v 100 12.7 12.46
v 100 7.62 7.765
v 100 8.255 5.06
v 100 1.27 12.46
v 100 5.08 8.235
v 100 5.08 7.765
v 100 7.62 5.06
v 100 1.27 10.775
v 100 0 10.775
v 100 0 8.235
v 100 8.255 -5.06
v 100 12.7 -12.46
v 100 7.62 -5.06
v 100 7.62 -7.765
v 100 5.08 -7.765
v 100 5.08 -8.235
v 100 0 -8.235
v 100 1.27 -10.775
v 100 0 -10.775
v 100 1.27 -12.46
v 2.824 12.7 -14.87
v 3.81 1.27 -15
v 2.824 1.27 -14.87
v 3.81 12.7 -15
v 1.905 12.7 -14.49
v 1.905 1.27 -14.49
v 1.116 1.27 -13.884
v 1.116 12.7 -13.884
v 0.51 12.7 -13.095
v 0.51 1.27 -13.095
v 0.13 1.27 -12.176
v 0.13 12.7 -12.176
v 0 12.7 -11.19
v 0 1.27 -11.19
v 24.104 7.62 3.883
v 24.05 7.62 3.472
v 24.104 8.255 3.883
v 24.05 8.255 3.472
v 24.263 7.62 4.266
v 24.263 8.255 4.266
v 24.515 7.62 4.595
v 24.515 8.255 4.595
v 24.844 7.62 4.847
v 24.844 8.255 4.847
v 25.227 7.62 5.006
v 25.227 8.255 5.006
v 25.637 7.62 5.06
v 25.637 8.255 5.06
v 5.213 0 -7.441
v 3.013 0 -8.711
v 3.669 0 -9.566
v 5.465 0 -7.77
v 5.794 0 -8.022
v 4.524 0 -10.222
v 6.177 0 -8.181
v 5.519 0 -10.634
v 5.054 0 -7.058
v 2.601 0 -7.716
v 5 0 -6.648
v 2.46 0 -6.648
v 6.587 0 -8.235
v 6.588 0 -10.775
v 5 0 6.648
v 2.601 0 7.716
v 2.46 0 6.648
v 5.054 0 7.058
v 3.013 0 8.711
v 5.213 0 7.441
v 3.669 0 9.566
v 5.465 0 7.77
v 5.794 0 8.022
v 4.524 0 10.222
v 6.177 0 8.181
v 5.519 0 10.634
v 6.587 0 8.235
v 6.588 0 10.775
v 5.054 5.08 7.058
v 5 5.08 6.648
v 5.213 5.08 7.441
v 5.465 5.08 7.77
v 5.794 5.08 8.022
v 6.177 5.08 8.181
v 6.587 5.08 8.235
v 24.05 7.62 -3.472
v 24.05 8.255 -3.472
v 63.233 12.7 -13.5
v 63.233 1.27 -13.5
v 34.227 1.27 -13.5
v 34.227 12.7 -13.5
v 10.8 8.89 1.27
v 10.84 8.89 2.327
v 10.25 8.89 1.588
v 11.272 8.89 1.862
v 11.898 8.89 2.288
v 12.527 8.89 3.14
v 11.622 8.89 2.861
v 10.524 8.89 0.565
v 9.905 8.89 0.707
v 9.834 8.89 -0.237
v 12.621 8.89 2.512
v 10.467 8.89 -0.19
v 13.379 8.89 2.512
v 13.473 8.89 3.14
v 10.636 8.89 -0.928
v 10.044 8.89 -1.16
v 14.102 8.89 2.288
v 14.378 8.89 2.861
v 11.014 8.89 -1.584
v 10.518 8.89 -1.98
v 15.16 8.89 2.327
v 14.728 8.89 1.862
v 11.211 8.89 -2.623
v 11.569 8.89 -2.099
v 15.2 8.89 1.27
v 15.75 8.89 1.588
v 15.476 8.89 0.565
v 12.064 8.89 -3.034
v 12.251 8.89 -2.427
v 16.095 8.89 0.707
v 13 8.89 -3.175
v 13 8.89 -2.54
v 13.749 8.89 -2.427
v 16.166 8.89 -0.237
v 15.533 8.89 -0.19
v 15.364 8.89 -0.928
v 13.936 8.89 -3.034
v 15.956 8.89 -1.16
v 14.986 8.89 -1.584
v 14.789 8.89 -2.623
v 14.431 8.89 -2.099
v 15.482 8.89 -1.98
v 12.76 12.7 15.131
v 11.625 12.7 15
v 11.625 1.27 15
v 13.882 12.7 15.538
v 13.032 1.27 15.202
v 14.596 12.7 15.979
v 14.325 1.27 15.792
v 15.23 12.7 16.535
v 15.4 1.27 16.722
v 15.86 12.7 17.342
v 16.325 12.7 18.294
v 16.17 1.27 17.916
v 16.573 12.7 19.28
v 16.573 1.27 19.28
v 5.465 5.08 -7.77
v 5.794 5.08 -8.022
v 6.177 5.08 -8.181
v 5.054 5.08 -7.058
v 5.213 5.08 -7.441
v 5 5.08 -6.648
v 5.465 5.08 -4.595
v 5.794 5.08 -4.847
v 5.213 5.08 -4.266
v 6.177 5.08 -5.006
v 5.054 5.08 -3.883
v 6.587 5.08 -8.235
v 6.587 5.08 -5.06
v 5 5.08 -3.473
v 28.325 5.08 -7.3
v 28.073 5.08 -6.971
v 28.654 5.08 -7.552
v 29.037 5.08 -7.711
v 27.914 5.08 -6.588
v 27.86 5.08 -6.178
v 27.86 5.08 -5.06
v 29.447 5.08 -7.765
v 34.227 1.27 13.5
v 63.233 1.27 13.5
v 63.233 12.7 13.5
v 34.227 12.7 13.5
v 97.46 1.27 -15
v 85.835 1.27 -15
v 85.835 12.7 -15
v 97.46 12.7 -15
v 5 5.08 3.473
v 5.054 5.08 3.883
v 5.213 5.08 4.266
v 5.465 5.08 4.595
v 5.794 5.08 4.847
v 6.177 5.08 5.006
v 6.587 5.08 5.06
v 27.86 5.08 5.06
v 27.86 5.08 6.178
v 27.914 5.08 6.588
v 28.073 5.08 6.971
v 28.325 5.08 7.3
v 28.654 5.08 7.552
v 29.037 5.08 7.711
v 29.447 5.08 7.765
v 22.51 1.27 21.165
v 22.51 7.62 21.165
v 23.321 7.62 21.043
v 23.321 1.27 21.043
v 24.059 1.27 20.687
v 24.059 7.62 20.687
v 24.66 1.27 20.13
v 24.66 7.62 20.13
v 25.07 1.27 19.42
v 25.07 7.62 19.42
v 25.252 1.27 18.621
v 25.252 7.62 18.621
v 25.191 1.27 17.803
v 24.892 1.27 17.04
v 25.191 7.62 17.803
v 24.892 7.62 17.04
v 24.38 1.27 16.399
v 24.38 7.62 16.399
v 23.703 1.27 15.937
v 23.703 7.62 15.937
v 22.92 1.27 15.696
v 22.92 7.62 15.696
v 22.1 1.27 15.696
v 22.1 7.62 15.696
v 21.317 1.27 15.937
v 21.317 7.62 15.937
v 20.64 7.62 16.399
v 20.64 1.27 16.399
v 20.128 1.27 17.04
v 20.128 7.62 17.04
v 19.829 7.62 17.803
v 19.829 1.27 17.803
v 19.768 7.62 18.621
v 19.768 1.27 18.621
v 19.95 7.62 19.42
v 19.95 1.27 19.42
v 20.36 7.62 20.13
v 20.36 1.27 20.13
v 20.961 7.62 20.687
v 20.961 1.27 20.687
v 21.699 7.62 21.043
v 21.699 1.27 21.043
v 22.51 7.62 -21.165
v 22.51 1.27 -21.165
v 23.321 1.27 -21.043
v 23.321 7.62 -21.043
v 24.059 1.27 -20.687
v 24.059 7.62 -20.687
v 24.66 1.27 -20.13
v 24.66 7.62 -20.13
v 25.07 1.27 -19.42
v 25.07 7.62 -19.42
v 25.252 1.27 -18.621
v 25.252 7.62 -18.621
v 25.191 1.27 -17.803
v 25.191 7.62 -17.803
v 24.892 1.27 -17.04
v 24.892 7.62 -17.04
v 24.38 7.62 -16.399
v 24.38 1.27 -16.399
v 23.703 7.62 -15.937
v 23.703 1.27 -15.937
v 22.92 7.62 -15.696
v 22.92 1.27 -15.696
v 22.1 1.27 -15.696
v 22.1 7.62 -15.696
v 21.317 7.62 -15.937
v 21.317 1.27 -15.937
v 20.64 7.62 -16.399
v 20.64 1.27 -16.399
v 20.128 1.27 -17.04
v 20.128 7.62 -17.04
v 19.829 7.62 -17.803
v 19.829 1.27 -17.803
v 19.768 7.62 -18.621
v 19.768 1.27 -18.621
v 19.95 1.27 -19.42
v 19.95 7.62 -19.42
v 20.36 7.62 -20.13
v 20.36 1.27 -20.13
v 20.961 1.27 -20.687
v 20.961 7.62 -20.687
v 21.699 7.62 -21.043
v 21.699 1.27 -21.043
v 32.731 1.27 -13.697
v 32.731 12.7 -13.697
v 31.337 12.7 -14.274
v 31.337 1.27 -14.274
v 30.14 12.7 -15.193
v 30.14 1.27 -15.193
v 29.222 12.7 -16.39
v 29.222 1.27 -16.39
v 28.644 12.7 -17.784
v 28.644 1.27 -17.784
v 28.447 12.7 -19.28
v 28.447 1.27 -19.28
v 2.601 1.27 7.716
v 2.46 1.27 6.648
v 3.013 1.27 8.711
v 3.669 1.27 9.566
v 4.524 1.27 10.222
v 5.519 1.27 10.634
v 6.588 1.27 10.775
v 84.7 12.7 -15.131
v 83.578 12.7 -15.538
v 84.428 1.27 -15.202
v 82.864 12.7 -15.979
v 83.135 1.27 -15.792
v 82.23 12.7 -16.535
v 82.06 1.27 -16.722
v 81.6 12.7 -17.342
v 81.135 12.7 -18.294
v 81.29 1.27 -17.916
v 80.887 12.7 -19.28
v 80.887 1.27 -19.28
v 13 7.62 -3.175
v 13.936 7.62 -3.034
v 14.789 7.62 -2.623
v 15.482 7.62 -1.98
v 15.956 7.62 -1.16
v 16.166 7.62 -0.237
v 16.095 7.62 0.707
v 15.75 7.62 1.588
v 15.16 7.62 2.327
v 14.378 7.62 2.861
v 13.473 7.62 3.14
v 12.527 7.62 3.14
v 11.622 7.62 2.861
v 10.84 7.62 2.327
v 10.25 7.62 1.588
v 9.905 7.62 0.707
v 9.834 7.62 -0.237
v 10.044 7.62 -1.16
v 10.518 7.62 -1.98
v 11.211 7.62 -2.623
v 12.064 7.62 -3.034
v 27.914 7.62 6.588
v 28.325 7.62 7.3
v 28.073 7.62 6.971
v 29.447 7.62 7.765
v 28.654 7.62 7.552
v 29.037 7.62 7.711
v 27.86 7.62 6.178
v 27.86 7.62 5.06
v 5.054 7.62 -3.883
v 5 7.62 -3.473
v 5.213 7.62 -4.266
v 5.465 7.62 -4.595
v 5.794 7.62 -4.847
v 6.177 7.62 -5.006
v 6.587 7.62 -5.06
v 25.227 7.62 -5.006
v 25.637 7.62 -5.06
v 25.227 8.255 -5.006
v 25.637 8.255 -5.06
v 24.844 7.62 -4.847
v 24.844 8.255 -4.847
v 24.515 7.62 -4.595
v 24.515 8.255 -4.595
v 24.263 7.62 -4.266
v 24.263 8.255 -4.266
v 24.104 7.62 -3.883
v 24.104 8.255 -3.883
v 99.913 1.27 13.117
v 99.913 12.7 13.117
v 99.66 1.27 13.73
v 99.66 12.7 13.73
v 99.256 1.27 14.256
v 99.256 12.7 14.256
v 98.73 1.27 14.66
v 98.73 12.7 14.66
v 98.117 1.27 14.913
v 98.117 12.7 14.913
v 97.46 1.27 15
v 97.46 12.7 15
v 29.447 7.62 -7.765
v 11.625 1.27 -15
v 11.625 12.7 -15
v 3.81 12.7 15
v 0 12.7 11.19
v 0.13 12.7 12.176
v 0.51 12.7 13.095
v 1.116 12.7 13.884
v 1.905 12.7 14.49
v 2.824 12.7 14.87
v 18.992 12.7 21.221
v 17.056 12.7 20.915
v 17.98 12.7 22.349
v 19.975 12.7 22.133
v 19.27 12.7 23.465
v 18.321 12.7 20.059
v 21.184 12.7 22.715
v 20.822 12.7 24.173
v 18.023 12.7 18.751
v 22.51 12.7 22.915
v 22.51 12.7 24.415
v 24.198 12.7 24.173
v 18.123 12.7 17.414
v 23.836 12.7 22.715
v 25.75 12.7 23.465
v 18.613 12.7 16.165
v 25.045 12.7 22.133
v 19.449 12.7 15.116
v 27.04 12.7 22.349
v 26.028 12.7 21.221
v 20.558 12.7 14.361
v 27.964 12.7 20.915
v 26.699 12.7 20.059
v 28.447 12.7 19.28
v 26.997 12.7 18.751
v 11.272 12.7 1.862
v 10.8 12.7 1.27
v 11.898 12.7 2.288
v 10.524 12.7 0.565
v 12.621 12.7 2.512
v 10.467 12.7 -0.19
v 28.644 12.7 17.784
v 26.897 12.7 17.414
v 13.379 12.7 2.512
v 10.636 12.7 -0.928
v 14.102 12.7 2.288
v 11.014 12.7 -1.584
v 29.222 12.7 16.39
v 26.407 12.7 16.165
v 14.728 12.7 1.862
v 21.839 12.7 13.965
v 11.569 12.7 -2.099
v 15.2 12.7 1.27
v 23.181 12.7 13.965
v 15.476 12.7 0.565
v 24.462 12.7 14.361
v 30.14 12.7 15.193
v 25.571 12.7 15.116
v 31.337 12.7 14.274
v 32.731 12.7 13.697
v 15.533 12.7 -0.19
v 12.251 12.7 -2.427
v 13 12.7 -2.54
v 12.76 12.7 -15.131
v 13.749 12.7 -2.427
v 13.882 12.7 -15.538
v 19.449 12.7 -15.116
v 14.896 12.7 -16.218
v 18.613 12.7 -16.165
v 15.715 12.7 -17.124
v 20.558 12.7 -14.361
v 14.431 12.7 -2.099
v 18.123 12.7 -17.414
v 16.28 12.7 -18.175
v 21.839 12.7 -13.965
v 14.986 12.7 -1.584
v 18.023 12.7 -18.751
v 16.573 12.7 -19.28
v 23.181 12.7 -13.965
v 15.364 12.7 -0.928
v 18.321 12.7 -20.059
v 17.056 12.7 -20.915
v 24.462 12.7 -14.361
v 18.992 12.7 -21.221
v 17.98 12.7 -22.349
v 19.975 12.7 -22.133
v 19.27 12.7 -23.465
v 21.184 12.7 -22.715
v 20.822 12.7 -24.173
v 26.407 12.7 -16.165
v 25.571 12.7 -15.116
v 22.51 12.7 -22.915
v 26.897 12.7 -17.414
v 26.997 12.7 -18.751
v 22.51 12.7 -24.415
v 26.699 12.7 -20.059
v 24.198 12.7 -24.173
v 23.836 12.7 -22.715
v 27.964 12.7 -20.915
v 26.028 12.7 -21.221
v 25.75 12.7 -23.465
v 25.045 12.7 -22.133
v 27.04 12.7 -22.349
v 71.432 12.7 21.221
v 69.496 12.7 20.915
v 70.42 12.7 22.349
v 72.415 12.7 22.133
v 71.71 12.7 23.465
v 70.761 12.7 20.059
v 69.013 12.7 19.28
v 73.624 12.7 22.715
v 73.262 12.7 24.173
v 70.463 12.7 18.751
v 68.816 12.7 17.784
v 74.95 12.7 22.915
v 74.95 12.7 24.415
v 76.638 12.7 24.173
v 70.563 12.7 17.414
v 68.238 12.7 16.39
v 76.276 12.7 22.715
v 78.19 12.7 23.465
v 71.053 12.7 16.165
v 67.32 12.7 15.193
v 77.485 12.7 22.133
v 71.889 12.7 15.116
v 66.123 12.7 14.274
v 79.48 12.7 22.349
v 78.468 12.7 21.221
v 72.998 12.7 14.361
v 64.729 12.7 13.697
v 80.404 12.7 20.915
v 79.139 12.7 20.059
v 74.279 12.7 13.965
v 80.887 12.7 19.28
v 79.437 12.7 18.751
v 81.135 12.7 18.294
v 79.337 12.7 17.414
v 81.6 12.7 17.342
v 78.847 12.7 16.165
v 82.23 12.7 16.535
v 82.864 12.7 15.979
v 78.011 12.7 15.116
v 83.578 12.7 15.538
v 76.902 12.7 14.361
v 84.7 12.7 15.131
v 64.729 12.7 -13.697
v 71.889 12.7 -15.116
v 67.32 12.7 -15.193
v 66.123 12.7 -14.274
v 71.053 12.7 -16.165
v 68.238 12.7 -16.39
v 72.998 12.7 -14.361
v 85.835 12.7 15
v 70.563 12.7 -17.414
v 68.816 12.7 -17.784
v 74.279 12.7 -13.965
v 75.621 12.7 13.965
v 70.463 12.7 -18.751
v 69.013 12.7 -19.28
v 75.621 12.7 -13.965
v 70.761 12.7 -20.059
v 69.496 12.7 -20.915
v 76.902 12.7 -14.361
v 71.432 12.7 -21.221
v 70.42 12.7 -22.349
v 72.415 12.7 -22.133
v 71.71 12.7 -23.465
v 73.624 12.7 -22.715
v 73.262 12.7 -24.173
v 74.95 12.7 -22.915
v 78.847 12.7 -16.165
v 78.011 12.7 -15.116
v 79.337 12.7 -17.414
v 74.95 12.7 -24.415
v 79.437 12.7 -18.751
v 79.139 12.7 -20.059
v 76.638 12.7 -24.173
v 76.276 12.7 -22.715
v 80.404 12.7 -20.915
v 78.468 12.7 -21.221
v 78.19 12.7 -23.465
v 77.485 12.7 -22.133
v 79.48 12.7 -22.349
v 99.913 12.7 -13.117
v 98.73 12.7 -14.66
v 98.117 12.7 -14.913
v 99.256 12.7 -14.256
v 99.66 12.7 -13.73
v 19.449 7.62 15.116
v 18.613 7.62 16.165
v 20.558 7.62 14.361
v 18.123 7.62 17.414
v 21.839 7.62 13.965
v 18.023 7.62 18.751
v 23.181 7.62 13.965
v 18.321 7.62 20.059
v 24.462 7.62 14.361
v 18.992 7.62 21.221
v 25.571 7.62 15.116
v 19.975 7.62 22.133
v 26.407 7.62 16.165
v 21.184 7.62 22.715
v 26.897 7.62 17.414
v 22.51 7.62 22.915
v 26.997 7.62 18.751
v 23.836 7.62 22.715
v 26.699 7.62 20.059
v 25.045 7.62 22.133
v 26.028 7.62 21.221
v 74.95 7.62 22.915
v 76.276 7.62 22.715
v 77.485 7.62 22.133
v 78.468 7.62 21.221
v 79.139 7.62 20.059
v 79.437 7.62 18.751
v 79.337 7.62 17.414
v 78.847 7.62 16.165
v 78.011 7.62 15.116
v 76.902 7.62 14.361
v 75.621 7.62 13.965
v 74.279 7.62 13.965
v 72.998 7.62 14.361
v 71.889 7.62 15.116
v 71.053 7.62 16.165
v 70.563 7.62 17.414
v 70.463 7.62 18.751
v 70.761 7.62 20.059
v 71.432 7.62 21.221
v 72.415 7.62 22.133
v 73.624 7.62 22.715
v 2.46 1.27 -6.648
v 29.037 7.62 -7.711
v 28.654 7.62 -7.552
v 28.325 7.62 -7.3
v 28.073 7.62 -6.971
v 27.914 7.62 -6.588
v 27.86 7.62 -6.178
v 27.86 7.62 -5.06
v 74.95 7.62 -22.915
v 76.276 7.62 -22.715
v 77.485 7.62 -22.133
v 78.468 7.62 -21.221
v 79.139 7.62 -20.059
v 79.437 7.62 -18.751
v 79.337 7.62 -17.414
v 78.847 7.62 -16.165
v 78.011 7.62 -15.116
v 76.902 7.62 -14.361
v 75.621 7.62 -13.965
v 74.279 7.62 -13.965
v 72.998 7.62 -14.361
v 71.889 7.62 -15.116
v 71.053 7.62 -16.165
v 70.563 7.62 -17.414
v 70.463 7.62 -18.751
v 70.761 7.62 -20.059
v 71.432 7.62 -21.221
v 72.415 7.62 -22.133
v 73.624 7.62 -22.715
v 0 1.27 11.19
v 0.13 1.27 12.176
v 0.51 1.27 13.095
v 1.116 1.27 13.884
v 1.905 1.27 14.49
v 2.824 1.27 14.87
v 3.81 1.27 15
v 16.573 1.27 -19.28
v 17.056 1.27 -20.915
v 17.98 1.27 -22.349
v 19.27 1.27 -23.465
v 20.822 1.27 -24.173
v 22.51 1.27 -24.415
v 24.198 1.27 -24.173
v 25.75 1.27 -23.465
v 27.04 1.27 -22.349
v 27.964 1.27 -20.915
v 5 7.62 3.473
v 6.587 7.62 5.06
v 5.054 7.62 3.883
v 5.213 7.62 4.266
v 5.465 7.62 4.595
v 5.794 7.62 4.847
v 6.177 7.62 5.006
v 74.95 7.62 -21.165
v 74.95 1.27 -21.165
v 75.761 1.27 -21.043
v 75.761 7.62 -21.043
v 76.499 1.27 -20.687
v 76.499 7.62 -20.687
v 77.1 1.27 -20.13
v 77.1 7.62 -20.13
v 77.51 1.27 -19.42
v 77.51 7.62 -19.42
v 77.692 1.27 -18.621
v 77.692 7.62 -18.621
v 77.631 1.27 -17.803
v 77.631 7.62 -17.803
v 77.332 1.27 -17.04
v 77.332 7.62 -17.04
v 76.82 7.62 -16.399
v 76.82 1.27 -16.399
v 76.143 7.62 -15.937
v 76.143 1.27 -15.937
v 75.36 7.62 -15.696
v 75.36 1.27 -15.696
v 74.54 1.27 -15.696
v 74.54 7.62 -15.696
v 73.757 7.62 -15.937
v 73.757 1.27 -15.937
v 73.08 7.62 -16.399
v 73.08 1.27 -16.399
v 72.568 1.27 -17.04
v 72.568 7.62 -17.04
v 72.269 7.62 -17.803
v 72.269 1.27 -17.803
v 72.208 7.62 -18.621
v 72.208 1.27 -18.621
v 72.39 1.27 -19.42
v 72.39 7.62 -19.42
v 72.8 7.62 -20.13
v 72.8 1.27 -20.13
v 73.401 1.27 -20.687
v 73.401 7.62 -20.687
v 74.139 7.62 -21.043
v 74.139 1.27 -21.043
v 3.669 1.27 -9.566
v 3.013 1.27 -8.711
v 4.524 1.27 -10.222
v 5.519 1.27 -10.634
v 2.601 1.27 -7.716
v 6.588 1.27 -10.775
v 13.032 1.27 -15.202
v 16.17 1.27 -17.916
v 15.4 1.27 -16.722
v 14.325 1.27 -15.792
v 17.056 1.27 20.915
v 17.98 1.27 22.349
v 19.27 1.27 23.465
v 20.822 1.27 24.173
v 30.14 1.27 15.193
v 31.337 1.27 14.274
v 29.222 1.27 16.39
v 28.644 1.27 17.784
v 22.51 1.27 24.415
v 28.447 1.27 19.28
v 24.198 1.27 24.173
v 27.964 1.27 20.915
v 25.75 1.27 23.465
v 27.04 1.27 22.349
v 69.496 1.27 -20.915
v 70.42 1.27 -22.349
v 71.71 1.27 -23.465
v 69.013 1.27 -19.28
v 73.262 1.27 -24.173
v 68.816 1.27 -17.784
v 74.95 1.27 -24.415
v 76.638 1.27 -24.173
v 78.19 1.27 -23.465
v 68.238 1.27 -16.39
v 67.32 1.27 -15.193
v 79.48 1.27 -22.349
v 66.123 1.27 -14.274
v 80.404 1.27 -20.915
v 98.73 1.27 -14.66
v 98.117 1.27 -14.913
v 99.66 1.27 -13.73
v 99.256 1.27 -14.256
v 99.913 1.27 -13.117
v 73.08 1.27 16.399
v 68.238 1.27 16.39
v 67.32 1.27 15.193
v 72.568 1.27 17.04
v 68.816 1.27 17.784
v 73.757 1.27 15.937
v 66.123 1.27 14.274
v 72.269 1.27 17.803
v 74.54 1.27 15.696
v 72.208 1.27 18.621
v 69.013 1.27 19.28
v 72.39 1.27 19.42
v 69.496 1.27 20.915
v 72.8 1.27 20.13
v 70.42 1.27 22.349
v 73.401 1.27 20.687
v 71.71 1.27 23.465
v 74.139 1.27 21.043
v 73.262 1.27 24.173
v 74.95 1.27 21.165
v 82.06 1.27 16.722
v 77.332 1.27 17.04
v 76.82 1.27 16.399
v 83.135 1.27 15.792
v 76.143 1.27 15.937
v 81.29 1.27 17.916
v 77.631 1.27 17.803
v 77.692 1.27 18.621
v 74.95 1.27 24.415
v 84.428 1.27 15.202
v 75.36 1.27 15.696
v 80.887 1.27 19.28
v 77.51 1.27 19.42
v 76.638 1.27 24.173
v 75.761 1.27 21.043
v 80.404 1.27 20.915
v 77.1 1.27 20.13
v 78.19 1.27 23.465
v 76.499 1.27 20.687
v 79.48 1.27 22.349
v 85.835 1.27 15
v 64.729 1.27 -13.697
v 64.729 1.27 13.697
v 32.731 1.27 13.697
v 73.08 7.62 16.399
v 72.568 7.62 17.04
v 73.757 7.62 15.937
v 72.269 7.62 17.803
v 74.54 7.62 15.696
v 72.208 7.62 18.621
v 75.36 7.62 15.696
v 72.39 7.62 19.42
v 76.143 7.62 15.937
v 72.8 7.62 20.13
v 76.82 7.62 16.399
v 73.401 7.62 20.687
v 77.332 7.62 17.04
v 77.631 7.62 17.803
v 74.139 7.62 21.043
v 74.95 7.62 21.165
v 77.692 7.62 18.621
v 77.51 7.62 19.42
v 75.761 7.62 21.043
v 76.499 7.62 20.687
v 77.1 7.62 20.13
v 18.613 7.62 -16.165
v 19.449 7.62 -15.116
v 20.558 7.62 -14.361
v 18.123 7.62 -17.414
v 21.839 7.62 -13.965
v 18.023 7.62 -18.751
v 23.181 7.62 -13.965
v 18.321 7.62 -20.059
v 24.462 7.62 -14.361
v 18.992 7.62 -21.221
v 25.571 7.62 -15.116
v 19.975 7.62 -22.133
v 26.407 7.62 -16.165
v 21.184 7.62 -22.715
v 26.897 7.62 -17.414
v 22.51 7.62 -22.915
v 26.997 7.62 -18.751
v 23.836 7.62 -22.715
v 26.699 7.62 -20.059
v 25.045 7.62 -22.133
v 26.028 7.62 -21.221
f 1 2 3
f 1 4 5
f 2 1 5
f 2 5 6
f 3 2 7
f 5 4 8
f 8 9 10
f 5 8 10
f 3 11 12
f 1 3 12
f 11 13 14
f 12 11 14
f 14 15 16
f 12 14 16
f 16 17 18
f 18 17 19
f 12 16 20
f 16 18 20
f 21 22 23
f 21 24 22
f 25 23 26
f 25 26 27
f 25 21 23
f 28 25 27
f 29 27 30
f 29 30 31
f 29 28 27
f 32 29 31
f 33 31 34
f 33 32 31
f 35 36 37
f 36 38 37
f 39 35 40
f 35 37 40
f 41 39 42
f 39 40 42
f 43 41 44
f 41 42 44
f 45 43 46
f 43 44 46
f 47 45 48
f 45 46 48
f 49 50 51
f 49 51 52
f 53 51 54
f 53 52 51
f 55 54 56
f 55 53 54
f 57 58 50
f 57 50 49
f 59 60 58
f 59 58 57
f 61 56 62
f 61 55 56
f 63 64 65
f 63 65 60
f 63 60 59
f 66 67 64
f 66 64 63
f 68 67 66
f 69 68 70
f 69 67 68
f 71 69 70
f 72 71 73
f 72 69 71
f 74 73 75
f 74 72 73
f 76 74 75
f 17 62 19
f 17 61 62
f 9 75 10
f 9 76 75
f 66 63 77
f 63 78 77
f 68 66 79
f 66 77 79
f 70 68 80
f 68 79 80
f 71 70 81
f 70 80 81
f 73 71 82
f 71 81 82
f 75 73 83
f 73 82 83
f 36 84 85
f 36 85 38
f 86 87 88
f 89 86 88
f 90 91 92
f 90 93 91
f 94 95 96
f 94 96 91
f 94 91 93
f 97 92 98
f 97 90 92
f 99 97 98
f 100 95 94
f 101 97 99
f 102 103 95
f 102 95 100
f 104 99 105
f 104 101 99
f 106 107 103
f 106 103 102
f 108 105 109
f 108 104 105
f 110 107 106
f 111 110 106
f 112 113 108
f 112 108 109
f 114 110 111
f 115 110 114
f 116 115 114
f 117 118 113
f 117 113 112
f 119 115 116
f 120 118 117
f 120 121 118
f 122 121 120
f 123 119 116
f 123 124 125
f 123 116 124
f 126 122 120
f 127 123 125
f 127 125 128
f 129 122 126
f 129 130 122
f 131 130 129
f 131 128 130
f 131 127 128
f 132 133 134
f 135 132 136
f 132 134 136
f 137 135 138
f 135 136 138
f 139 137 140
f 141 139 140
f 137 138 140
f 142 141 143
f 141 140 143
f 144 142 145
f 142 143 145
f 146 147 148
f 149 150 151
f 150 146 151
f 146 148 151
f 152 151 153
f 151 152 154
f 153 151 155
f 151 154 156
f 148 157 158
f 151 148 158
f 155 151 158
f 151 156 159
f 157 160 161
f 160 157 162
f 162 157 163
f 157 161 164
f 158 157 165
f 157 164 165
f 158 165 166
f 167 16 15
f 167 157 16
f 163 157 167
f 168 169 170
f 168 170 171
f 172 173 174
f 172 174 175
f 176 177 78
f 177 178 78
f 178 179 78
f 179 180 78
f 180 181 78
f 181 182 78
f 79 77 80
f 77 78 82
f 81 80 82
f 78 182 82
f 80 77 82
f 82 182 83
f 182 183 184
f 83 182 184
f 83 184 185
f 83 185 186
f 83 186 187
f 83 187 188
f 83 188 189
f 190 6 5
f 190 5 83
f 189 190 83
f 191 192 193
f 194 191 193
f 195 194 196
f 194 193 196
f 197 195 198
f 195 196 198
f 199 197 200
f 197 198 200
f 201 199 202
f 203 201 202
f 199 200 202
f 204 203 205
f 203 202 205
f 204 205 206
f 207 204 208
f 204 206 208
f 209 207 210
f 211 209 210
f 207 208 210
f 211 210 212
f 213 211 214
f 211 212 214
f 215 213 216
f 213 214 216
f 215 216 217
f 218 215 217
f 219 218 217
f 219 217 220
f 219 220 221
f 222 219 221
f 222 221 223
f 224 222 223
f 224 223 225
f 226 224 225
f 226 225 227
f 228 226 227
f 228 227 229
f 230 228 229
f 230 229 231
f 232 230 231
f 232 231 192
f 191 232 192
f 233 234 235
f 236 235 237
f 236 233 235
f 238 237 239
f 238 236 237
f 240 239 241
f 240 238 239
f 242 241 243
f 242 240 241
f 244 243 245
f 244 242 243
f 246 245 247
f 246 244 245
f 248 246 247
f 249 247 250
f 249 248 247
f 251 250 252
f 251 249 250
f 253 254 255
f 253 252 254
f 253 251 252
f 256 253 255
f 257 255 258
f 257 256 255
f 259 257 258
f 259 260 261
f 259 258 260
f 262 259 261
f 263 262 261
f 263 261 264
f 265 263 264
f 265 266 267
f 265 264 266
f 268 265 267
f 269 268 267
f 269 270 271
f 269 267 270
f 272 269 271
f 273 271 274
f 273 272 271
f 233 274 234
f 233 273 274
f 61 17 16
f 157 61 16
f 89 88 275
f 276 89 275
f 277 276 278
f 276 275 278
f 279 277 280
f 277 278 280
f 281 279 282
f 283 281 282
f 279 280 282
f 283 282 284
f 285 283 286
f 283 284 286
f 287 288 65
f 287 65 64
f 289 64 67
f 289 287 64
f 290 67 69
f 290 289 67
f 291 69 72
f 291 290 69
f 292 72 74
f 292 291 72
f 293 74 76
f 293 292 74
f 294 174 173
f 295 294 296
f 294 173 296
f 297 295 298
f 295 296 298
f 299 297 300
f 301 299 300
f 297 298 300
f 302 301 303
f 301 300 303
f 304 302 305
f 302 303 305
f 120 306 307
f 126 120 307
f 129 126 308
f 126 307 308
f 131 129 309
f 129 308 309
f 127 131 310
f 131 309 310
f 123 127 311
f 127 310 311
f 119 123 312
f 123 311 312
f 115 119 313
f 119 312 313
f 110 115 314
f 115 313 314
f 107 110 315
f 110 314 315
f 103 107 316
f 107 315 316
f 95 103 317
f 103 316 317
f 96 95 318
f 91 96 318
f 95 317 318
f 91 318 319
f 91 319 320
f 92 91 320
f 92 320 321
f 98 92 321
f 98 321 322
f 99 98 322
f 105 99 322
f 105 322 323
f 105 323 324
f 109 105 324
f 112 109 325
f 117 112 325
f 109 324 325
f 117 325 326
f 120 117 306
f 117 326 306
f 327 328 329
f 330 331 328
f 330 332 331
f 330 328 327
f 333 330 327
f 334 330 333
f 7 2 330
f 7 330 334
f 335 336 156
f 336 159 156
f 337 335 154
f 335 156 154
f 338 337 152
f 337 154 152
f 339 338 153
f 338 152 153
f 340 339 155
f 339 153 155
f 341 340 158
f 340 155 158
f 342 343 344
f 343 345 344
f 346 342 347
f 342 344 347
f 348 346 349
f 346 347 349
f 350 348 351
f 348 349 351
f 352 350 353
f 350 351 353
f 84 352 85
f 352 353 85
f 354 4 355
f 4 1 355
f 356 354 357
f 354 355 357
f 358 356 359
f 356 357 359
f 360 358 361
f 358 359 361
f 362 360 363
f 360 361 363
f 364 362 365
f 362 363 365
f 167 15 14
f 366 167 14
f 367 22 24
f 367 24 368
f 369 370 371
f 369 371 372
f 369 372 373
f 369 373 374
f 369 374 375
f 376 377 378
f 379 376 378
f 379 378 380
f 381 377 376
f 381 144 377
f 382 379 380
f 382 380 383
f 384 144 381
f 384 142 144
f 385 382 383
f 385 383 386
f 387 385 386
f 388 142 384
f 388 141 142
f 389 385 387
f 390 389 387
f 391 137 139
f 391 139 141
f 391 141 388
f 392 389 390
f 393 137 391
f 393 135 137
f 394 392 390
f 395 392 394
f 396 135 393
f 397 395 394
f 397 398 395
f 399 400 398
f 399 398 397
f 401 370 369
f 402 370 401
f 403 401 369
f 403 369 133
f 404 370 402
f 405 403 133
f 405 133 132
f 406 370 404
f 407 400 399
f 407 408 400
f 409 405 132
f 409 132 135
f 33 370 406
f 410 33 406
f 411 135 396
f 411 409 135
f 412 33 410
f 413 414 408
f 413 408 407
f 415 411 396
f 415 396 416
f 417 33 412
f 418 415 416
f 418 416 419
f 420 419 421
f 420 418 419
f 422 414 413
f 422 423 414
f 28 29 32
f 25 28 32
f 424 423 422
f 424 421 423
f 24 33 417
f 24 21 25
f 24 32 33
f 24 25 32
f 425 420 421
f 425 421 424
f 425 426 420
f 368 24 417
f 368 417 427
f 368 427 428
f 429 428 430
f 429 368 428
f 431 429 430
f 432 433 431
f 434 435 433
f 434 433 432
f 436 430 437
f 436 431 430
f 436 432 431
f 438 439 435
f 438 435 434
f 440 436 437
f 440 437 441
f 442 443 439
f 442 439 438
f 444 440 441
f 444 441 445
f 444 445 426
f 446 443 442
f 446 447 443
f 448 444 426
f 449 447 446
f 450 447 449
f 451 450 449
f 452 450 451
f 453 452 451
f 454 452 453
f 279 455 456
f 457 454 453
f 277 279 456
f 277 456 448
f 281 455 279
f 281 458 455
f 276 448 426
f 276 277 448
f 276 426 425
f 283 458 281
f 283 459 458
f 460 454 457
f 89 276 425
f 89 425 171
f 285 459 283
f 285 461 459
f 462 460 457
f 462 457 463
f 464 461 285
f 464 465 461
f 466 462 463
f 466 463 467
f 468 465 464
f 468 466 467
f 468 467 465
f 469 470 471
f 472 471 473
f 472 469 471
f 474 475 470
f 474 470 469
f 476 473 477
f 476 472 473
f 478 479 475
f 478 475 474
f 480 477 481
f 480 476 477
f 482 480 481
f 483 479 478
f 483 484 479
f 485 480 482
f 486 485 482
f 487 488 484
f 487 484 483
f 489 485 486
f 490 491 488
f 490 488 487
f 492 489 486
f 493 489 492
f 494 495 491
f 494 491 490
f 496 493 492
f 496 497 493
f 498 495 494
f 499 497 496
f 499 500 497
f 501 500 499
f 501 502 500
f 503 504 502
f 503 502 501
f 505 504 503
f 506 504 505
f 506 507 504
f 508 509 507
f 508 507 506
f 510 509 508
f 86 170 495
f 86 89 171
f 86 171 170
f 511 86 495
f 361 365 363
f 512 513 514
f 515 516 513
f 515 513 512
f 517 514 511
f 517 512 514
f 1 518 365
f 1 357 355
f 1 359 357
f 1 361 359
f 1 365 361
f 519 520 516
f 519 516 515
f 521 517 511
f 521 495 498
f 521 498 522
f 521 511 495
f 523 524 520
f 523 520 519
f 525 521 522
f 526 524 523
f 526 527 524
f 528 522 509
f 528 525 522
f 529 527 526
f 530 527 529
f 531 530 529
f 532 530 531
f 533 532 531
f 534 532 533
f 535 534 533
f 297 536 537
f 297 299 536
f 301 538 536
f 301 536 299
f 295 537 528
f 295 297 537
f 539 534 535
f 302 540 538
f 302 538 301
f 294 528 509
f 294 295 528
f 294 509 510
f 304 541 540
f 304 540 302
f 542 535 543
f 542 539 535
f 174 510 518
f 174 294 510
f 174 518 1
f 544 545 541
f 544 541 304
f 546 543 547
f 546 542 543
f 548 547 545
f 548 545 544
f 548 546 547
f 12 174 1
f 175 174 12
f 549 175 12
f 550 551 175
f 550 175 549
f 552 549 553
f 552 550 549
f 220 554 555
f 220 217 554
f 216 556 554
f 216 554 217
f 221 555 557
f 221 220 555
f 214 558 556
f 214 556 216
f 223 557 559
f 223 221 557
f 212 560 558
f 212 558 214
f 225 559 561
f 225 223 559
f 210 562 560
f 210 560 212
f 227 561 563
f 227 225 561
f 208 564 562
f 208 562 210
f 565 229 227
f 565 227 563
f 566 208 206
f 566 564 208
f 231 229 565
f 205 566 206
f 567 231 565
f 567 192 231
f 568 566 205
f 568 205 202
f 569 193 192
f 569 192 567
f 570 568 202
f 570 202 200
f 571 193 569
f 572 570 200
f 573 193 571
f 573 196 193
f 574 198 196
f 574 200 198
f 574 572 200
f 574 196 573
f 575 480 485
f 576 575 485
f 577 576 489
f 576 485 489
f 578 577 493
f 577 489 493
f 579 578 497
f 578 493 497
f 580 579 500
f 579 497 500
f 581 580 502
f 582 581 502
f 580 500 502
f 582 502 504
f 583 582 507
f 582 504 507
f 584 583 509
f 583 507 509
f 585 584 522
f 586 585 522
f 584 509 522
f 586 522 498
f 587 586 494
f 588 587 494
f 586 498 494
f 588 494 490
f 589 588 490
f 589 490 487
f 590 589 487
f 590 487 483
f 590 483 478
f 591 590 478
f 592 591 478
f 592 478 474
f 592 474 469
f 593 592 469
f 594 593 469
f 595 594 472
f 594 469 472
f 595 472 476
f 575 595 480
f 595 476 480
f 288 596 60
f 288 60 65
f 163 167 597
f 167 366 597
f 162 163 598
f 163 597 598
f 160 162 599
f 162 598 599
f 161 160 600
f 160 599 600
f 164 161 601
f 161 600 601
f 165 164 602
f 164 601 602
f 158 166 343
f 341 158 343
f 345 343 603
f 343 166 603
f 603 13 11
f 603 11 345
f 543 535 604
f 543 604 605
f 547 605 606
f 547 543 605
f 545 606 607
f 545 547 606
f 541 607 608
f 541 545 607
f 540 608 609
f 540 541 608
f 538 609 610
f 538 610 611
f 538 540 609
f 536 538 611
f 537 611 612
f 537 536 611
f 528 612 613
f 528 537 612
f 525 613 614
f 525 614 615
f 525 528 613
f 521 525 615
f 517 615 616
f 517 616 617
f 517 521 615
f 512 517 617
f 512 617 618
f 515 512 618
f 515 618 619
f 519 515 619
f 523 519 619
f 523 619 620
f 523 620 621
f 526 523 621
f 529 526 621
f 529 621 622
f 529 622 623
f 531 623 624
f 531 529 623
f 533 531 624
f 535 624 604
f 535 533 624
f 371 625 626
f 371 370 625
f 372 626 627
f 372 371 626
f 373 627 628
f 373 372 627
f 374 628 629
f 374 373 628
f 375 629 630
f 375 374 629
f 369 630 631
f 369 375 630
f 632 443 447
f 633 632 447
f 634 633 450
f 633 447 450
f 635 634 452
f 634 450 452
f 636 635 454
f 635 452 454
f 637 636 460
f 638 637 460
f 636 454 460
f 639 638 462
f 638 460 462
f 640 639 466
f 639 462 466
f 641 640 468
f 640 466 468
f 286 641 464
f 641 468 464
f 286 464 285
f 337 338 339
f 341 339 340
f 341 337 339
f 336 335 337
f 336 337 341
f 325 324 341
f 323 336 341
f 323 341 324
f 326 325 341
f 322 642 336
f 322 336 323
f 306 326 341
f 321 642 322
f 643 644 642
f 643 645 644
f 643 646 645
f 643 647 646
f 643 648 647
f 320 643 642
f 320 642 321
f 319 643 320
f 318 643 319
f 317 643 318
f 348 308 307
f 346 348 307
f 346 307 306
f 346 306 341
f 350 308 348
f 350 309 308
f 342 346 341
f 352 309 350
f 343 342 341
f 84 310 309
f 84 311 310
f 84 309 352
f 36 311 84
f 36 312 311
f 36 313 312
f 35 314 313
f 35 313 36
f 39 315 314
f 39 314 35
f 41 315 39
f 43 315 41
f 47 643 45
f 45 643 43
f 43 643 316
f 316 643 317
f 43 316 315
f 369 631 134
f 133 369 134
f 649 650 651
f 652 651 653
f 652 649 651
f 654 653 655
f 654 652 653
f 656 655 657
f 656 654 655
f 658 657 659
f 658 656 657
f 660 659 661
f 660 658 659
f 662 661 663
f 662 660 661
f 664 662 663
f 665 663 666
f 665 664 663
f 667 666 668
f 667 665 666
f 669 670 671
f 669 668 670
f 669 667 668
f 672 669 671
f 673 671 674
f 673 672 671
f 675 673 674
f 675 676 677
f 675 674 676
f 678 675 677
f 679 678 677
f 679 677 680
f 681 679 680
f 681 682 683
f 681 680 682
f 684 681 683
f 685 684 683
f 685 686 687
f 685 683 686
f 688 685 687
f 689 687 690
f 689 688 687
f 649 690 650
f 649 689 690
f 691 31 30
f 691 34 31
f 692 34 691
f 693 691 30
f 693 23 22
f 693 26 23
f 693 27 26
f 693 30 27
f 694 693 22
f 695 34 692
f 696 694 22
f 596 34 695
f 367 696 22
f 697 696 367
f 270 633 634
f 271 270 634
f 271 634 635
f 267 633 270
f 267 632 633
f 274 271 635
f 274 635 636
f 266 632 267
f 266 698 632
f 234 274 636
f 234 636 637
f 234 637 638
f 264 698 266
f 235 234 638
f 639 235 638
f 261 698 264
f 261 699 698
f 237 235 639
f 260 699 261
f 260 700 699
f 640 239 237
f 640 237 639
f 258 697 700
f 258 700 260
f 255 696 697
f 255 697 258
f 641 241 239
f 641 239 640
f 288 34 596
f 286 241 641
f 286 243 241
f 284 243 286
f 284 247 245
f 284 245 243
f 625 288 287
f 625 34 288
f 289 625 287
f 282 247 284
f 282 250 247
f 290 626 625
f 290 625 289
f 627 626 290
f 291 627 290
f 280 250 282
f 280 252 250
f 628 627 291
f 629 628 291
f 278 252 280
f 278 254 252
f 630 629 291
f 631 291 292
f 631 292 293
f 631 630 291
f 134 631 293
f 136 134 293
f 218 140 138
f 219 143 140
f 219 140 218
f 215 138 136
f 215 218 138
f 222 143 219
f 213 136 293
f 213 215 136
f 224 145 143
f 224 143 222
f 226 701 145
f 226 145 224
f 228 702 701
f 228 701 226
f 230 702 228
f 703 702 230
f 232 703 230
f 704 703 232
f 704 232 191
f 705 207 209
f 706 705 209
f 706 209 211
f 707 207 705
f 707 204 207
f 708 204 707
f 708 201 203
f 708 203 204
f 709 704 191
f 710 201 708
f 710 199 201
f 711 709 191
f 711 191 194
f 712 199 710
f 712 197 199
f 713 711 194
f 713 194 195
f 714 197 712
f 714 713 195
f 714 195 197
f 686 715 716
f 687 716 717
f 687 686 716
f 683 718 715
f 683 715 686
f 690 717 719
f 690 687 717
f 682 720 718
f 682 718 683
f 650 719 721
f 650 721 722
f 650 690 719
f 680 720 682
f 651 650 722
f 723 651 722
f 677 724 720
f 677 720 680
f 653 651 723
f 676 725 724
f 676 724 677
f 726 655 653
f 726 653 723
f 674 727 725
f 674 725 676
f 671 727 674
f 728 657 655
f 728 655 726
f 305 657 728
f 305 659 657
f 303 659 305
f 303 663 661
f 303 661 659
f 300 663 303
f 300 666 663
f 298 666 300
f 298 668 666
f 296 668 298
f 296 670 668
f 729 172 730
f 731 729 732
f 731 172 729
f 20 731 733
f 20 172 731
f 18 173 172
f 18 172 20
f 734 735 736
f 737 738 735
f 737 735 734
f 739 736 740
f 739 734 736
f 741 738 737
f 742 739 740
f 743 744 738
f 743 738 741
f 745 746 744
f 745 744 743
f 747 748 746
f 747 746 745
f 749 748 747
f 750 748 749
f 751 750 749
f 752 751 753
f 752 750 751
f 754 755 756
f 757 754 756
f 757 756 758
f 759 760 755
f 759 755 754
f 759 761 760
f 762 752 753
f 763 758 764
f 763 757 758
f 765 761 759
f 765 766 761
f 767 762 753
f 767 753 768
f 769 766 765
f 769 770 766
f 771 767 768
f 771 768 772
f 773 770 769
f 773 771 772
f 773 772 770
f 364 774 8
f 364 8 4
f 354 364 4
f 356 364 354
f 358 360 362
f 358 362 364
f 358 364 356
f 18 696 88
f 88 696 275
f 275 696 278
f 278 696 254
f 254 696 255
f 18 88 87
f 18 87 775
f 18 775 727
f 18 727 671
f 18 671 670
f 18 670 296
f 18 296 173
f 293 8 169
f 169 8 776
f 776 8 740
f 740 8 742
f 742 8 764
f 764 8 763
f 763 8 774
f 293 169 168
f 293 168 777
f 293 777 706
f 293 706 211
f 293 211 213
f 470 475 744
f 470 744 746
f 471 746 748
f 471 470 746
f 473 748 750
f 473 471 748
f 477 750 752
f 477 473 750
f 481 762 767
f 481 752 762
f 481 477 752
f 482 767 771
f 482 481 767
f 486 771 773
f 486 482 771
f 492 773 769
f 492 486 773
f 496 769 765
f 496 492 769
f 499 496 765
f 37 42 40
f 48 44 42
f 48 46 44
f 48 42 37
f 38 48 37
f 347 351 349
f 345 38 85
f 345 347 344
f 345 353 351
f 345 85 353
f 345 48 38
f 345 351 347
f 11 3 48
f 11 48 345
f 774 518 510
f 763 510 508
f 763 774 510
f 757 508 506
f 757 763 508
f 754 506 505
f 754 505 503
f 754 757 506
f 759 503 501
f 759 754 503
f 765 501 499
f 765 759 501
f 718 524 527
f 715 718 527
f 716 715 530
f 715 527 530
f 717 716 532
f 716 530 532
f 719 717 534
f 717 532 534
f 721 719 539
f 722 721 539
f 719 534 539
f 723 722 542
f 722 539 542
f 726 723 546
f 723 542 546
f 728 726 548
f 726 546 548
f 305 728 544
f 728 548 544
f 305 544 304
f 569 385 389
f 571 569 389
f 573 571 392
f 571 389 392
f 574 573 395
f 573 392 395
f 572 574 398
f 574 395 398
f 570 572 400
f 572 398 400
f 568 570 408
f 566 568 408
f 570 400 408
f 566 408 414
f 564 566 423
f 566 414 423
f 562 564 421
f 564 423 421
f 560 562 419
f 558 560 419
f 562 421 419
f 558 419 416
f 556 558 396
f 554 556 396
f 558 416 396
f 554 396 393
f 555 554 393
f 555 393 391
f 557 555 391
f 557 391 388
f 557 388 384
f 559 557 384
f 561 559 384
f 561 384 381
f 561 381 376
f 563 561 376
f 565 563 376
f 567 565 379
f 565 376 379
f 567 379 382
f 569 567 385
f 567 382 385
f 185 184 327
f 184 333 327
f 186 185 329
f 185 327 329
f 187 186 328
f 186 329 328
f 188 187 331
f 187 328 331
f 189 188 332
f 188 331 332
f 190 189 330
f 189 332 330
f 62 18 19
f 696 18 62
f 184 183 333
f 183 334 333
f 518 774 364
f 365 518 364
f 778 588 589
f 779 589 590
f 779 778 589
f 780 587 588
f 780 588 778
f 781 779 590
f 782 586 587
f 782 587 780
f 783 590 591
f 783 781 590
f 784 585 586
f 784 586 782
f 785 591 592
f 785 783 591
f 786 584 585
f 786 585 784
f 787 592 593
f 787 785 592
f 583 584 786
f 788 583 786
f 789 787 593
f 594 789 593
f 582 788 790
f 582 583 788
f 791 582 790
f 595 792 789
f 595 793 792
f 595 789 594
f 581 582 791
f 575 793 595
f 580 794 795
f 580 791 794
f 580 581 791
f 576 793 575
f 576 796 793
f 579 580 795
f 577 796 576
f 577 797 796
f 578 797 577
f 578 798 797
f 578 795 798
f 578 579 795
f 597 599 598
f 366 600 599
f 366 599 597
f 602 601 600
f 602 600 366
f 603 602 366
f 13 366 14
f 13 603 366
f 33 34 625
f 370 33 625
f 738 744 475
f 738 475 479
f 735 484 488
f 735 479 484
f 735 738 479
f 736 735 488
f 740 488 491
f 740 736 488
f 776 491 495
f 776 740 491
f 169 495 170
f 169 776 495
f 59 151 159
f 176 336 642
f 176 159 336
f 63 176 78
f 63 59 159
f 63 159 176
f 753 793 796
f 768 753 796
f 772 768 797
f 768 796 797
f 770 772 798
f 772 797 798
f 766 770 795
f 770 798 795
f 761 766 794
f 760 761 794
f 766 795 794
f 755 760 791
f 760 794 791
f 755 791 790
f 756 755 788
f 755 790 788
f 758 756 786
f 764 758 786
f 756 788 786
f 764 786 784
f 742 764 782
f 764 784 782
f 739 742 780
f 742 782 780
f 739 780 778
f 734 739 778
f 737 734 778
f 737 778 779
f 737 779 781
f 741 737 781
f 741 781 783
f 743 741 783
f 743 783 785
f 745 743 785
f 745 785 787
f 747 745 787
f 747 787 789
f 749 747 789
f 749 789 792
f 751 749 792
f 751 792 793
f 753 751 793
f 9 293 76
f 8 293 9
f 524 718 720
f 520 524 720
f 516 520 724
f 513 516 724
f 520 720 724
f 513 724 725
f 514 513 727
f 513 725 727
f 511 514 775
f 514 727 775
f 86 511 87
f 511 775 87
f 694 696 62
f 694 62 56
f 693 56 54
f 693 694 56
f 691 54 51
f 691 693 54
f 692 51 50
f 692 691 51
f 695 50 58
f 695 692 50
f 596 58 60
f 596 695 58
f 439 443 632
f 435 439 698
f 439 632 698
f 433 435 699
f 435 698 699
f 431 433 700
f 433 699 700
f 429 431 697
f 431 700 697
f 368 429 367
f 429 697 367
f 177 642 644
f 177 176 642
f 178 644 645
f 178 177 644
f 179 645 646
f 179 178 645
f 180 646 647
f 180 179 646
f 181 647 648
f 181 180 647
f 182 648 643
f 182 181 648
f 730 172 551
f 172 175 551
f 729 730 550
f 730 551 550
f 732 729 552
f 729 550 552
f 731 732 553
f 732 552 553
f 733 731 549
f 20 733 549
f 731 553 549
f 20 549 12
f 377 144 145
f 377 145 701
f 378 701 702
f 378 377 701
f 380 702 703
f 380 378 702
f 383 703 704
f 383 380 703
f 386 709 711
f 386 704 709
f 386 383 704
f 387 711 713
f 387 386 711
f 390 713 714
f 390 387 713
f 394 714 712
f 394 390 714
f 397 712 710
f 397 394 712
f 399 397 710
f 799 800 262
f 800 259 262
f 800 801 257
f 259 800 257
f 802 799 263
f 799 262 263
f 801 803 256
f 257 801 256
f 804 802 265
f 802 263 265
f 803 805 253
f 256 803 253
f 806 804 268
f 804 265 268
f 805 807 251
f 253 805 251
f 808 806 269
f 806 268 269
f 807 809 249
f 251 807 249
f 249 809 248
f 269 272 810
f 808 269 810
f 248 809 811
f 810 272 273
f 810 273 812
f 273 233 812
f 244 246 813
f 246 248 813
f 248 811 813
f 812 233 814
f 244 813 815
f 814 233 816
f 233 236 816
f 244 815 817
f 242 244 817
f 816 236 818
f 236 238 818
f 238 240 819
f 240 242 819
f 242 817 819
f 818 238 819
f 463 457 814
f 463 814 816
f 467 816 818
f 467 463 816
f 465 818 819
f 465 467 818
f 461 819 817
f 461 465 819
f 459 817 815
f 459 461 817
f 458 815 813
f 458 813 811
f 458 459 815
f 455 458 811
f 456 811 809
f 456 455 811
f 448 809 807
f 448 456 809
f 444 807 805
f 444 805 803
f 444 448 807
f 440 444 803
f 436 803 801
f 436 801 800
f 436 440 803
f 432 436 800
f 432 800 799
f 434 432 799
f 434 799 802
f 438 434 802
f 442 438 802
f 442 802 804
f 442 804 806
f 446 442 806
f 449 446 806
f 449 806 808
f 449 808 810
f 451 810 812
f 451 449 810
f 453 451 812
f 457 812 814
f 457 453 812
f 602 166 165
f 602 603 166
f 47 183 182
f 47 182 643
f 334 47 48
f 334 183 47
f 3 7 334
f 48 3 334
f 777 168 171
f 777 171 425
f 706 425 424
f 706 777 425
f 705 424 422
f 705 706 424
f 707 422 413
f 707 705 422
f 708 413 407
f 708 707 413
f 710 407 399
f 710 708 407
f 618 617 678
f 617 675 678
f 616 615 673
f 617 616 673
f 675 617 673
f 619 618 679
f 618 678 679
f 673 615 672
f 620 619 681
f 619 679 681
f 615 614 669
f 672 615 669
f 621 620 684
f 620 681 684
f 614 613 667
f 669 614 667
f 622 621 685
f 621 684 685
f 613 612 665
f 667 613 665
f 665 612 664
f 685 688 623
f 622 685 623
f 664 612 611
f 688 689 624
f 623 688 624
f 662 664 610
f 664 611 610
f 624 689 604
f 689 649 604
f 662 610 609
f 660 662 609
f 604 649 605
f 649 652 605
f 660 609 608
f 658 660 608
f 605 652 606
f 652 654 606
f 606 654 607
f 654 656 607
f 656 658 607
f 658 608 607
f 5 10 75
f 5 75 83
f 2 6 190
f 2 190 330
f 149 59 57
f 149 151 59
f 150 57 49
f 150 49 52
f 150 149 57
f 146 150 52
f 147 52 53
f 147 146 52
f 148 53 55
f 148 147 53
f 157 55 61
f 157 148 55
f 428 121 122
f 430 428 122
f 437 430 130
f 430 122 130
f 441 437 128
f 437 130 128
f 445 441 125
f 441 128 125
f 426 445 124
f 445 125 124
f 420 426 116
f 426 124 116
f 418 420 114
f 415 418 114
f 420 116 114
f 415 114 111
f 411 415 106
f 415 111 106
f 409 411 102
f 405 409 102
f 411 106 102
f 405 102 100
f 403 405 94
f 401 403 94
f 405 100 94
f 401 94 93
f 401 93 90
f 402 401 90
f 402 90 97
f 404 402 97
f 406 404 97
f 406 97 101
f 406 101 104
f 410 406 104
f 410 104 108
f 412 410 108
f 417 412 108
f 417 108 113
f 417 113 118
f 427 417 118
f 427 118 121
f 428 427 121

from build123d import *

# Parameters (mm, degrees)
SKETCH1_W           = 100
SKETCH1_H           = 30
BOSS_EXTRUDE1_DEPTH = 12.7
SKETCH2_W           = 15.2
SKETCH2_H           = 7.62
CUT_EXTRUDE1_DEPTH  = 102.913149299
SKETCH3_W           = 0.635
SKETCH3_H           = 5.08
SKETCH3_W_2         = 10.12
SKETCH3_H_2         = 0.635
CUT_EXTRUDE2_DEPTH  = 102.913149299
BOSS_EXTRUDE2_REACH = 103.913
SKETCH4_W           = 5
SKETCH4_H           = 16.47
FILLET7_R           = 1.5875
FILLET8_R           = 1.5875
BOSS_EXTRUDE3_REACH = 103.405
SKETCH9_W           = 19.05
SKETCH9_H           = 10.12
SKETCH7_R           = 2.54
CUT_EXTRUDE4_DEPTH  = 102.405445613
SKETCH10_R          = 3.175
CUT_EXTRUDE6_DEPTH  = 1.27
FILLET5_R           = 1.5875
BOSS_EXTRUDE4_DEPTH = 12.7
SKETCH12_R          = 4.5
CUT_EXTRUDE7_DEPTH  = 5.08
SKETCH13_R          = 2.75
CUT_EXTRUDE8_DEPTH  = 104.218974152
FILLET6_R           = 5
CUT_EXTRUDE9_START  = -1.27
CUT_EXTRUDE9_DEPTH  = 1.27
SKETCH25_W          = 3.175
SKETCH25_H          = 2.54
BOSS_EXTRUDE5_DEPTH = 2.54
BOSS_EXTRUDE6_REACH = 82.186
SKETCH26_W          = 2.54
SKETCH26_H          = 2.54
SKETCH31_W          = 0.1651
SKETCH31_H          = 2.54
ADJUST_DEPTH        = 72.14
FILLET9_R           = 1.5875
CUT_EXTRUDE10_DEPTH = 104.569962596
FILLET10_R          = 3.81
FILLET11_R          = 2.54


with BuildPart() as part:
    # Sketch1 → Boss-Extrude1 (new body)
    with BuildSketch(Plane(origin=(0, 0, 0), x_dir=(1, 0, 0), z_dir=(0, 1, 0))):
        with Locations((50, 0)):
            Rectangle(SKETCH1_W, SKETCH1_H)
    extrude(amount=BOSS_EXTRUDE1_DEPTH)

    # Sketch2 → Cut-Extrude1 (cut, through all)
    with BuildSketch(Plane(origin=(100, 0, 0), x_dir=(0, 0, -1), z_dir=(1, 0, 0))):
        with Locations((0, 3.81)):
            Rectangle(SKETCH2_W, SKETCH2_H)
    extrude(amount=-CUT_EXTRUDE1_DEPTH, mode=Mode.SUBTRACT)

    # Sketch3 → Cut-Extrude2 (cut, through all)
    with BuildSketch(Plane(origin=(100, 0, 0), x_dir=(0, 0, -1), z_dir=(1, 0, 0))):
        with Locations((-7.9175, 2.54)):
            Rectangle(SKETCH3_W, SKETCH3_H)
        with Locations((0, 7.9375)):
            Rectangle(SKETCH3_W_2, SKETCH3_H_2)
        with Locations((7.9175, 2.54)):
            Rectangle(SKETCH3_W, SKETCH3_H)
    extrude(amount=-CUT_EXTRUDE2_DEPTH, mode=Mode.SUBTRACT)

    # Sketch4 → Boss-Extrude2 (add, up to next)
    with BuildSketch(Plane.XZ, mode=Mode.PRIVATE) as boss_extrude2_sk1:
        with Locations((2.5, 0)):
            Rectangle(SKETCH4_W, SKETCH4_H)
    boss_extrude2_tool1 = extrude(boss_extrude2_sk1.sketch, amount=-BOSS_EXTRUDE2_REACH, mode=Mode.PRIVATE) - part.part
    add(boss_extrude2_tool1.solids().sort_by_distance((2.5, 0, 0))[0])

    # Fillet7
    fillet7_edges = [part.edges().sort_by_distance(p)[0] for p in [
        (5, 6.35, 7.6),
        (5, 6.35, -7.6),
    ]]
    fillet(fillet7_edges, radius=FILLET7_R)

    # Fillet8
    fillet8_edges = [part.edges().sort_by_distance(p)[0] for p in [
        (5, 2.54, 8.235),
        (5, 2.54, -8.235),
    ]]
    fillet(fillet8_edges, radius=FILLET8_R)

    # Sketch9 → Boss-Extrude3 (add, up to next)
    with BuildSketch(Plane.XZ.offset(-7.62), mode=Mode.PRIVATE) as boss_extrude3_sk1:
        with Locations((14.525, 0)):
            Rectangle(SKETCH9_W, SKETCH9_H)
    boss_extrude3_tool1 = extrude(boss_extrude3_sk1.sketch, amount=-BOSS_EXTRUDE3_REACH, mode=Mode.PRIVATE) - part.part
    add(boss_extrude3_tool1.solids().sort_by_distance((14.525, 7.62, 0))[0])

    # Sketch7 → Cut-Extrude4 (cut, through all)
    with BuildSketch(Plane.XZ.offset(-7.62)):
        with Locations(Location((13, 0, 0), (0, 0, 270))):
            Circle(SKETCH7_R)
    extrude(amount=-CUT_EXTRUDE4_DEPTH, mode=Mode.SUBTRACT)

    # Sketch10 → Cut-Extrude6 (cut)
    with BuildSketch(Plane.XZ.offset(-7.62)):
        with Locations(Location((13, 0, 0), (0, 0, 270))):
            Circle(SKETCH10_R)
    extrude(amount=-CUT_EXTRUDE6_DEPTH, mode=Mode.SUBTRACT)

    # Fillet5
    fillet5_edges = [part.edges().sort_by_distance(p)[0] for p in [
        (24.05, 7.9375, 5.06),
        (24.05, 7.9375, -5.06),
    ]]
    fillet(fillet5_edges, radius=FILLET5_R)

    # Sketch11 → Boss-Extrude4 (add)
    with BuildSketch(Plane(origin=(0, 12.7, 0), x_dir=(1, 0, 0), z_dir=(0, 1, 0))):
        with BuildLine():
            Line((68.95, -15), (68.95, -18.415))
            ThreePointArc((68.95, -18.415), (74.95, -24.415), (80.95, -18.415))
            Line((80.95, -18.415), (80.95, -15))
            Line((80.95, -15), (68.95, -15))
        make_face()
        with BuildLine():
            Line((28.51, -18.415), (28.51, -15))
            Line((28.51, -15), (16.51, -15))
            Line((16.51, -15), (16.51, -18.415))
            ThreePointArc((16.51, -18.415), (22.51, -24.415), (28.51, -18.415))
        make_face()
    boss_extrude4 = extrude(amount=-BOSS_EXTRUDE4_DEPTH)

    # Sketch12 → Cut-Extrude7 (cut)
    with BuildSketch(Plane(origin=(0, 12.7, 0), x_dir=(1, 0, 0), z_dir=(0, 1, 0))):
        with Locations(Location((22.51, -18.415, 0), (0, 0, 270))):
            Circle(SKETCH12_R)
        with Locations(Location((74.95, -18.415, 0), (0, 0, 270))):
            Circle(SKETCH12_R)
    cut_extrude7 = extrude(amount=-CUT_EXTRUDE7_DEPTH, mode=Mode.SUBTRACT)

    # Sketch13 → Cut-Extrude8 (cut, through all)
    with BuildSketch(Plane(origin=(0, 7.62, 0), x_dir=(1, 0, 0), z_dir=(0, 1, 0))):
        with Locations(Location((22.51, -18.415, 0), (0, 0, 270))):
            Circle(SKETCH13_R)
        with Locations(Location((74.95, -18.415, 0), (0, 0, 270))):
            Circle(SKETCH13_R)
    cut_extrude8 = extrude(amount=-CUT_EXTRUDE8_DEPTH, mode=Mode.SUBTRACT)

    # Mirror1: Boss-Extrude4, Cut-Extrude7, Cut-Extrude8 across plane
    add(boss_extrude4.mirror(Plane.XY))
    add(cut_extrude7.mirror(Plane.XY), mode=Mode.SUBTRACT)
    add(cut_extrude8.mirror(Plane.XY), mode=Mode.SUBTRACT)

    # Fillet6
    fillet6_edges = [part.edges().sort_by_distance(p)[0] for p in [
        (16.51, 6.35, 15),
        (28.51, 6.35, 15),
        (68.95, 6.35, 15),
        (80.95, 6.35, 15),
        (80.95, 6.35, -15),
        (68.95, 6.35, -15),
        (16.51, 6.35, -15),
        (28.51, 6.35, -15),
    ]]
    fillet(fillet6_edges, radius=FILLET6_R)

    # Sketch24 → Cut-Extrude9 (cut)
    with BuildSketch(Plane.XZ.offset(CUT_EXTRUDE9_START)):
        with BuildLine():
            Line((100, -10.775), (6.5875, -10.775))
            ThreePointArc((6.5875, -10.775), (3.668916761, -9.566083239), (2.46, -6.6475))
            Line((2.46, -6.6475), (2.46, 6.6475))
            ThreePointArc((2.46, 6.6475), (3.668916761, 9.566083239), (6.5875, 10.775))
            Line((6.5875, 10.775), (100, 10.775))
            Line((100, 10.775), (100, 15))
            Line((100, 15), (85.835209001, 15))
            ThreePointArc((85.835209001, 15), (82.564297257, 16.218315671), (80.887386728, 19.279545455))
            ThreePointArc((80.887386728, 19.279545455), (74.95, 24.415), (69.012613272, 19.279545455))
            ThreePointArc((69.012613272, 19.279545455), (67.335702743, 16.218315671), (64.064790999, 15))
            Line((64.064790999, 15), (33.395209001, 15))
            ThreePointArc((33.395209001, 15), (30.124297257, 16.218315671), (28.447386728, 19.279545455))
            ThreePointArc((28.447386728, 19.279545455), (22.51, 24.415), (16.572613272, 19.279545455))
            ThreePointArc((16.572613272, 19.279545455), (14.895702743, 16.218315671), (11.624790999, 15))
            Line((11.624790999, 15), (0, 15))
            Line((0, 15), (0, -15))
            Line((0, -15), (11.624790999, -15))
            ThreePointArc((11.624790999, -15), (14.895702743, -16.218315671), (16.572613272, -19.279545455))
            ThreePointArc((16.572613272, -19.279545455), (22.51, -24.415), (28.447386728, -19.279545455))
            ThreePointArc((28.447386728, -19.279545455), (30.124297257, -16.218315671), (33.395209001, -15))
            Line((33.395209001, -15), (64.064790999, -15))
            ThreePointArc((64.064790999, -15), (67.335702743, -16.218315671), (69.012613272, -19.279545455))
            ThreePointArc((69.012613272, -19.279545455), (74.95, -24.415), (80.887386728, -19.279545455))
            ThreePointArc((80.887386728, -19.279545455), (82.564297257, -16.218315671), (85.835209001, -15))
            Line((85.835209001, -15), (100, -15))
            Line((100, -15), (100, -10.775))
        make_face()
    extrude(amount=CUT_EXTRUDE9_DEPTH, mode=Mode.SUBTRACT)

    # Sketch25 → Boss-Extrude5 (add)
    with BuildSketch(Plane.XZ.offset(-7.62)):
        with Locations((26.2725, 6.33)):
            Rectangle(SKETCH25_W, SKETCH25_H)
        with Locations((26.2725, -6.33)):
            Rectangle(SKETCH25_W, SKETCH25_H)
    extrude(amount=BOSS_EXTRUDE5_DEPTH)

    # Sketch26 → Boss-Extrude6 (add, up to next)
    with BuildSketch(Plane.ZY.offset(-24.685), mode=Mode.PRIVATE) as boss_extrude6_sk1:
        with Locations((6.33, 6.35)):
            Rectangle(SKETCH26_W, SKETCH26_H)
    boss_extrude6_tool1 = extrude(boss_extrude6_sk1.sketch, amount=BOSS_EXTRUDE6_REACH, mode=Mode.PRIVATE) - part.part
    # Sketch26 → Boss-Extrude6 (add, up to next)
    with BuildSketch(Plane.ZY.offset(-24.685), mode=Mode.PRIVATE) as boss_extrude6_sk2:
        with Locations((-6.33, 6.35)):
            Rectangle(SKETCH26_W, SKETCH26_H)
    boss_extrude6_tool2 = extrude(boss_extrude6_sk2.sketch, amount=BOSS_EXTRUDE6_REACH, mode=Mode.PRIVATE) - part.part
    add(boss_extrude6_tool1.solids().sort_by_distance((24.685, 6.35, 6.33))[0])
    add(boss_extrude6_tool2.solids().sort_by_distance((24.685, 6.35, -6.33))[0])

    # Sketch31 → adjust (cut)
    with BuildSketch(Plane(origin=(100, 0, 0), x_dir=(0, 0, -1), z_dir=(1, 0, 0))):
        with Locations((7.68255, 6.35)):
            Rectangle(SKETCH31_W, SKETCH31_H)
        with Locations((-7.68255, 6.35)):
            Rectangle(SKETCH31_W, SKETCH31_H)
    extrude(amount=-ADJUST_DEPTH, mode=Mode.SUBTRACT)

    # Fillet9
    fillet9_edges = [part.edges().sort_by_distance(p)[0] for p in [
        (5, 6.35, 5.06),
        (5, 6.35, -5.06),
        (27.86, 6.35, 7.7651),
        (27.86, 6.35, -7.7651),
    ]]
    fillet(fillet9_edges, radius=FILLET9_R)

    # Sketch33 → Cut-Extrude10 (cut, through all)
    with BuildSketch(Plane.XZ.offset(-1.27)):
        with BuildLine():
            Line((28.447386728, 19.279545455), (28.447386728, 29.295040307))
            Line((28.447386728, 29.295040307), (69.012613272, 29.295040307))
            Line((69.012613272, 29.295040307), (69.012613272, 19.279545455))
            ThreePointArc((69.012613272, 19.279545455), (67.319823601, 15.192789671), (63.233067818, 13.5))
            Line((63.233067818, 13.5), (34.226932182, 13.5))
            ThreePointArc((34.226932182, 13.5), (30.140176399, 15.192789671), (28.447386728, 19.279545455))
        make_face()
        with BuildLine():
            Line((28.447386728, -19.279545455), (28.447386728, -29.295040307))
            Line((28.447386728, -29.295040307), (69.012613272, -29.295040307))
            Line((69.012613272, -29.295040307), (69.012613272, -19.279545455))
            ThreePointArc((69.012613272, -19.279545455), (67.319823601, -15.192789671), (63.233067818, -13.5))
            Line((63.233067818, -13.5), (34.226932182, -13.5))
            ThreePointArc((34.226932182, -13.5), (30.140176399, -15.192789671), (28.447386728, -19.279545455))
        make_face()
    extrude(amount=-CUT_EXTRUDE10_DEPTH, mode=Mode.SUBTRACT)

    # Fillet10
    fillet10_edges = [part.edges().sort_by_distance(p)[0] for p in [
        (0, 6.985, 15),
        (0, 6.985, -15),
    ]]
    fillet(fillet10_edges, radius=FILLET10_R)

    # Fillet11
    fillet11_edges = [part.edges().sort_by_distance(p)[0] for p in [
        (100, 6.985, 15),
        (100, 6.985, -15),
    ]]
    fillet(fillet11_edges, radius=FILLET11_R)


solid = part.part
